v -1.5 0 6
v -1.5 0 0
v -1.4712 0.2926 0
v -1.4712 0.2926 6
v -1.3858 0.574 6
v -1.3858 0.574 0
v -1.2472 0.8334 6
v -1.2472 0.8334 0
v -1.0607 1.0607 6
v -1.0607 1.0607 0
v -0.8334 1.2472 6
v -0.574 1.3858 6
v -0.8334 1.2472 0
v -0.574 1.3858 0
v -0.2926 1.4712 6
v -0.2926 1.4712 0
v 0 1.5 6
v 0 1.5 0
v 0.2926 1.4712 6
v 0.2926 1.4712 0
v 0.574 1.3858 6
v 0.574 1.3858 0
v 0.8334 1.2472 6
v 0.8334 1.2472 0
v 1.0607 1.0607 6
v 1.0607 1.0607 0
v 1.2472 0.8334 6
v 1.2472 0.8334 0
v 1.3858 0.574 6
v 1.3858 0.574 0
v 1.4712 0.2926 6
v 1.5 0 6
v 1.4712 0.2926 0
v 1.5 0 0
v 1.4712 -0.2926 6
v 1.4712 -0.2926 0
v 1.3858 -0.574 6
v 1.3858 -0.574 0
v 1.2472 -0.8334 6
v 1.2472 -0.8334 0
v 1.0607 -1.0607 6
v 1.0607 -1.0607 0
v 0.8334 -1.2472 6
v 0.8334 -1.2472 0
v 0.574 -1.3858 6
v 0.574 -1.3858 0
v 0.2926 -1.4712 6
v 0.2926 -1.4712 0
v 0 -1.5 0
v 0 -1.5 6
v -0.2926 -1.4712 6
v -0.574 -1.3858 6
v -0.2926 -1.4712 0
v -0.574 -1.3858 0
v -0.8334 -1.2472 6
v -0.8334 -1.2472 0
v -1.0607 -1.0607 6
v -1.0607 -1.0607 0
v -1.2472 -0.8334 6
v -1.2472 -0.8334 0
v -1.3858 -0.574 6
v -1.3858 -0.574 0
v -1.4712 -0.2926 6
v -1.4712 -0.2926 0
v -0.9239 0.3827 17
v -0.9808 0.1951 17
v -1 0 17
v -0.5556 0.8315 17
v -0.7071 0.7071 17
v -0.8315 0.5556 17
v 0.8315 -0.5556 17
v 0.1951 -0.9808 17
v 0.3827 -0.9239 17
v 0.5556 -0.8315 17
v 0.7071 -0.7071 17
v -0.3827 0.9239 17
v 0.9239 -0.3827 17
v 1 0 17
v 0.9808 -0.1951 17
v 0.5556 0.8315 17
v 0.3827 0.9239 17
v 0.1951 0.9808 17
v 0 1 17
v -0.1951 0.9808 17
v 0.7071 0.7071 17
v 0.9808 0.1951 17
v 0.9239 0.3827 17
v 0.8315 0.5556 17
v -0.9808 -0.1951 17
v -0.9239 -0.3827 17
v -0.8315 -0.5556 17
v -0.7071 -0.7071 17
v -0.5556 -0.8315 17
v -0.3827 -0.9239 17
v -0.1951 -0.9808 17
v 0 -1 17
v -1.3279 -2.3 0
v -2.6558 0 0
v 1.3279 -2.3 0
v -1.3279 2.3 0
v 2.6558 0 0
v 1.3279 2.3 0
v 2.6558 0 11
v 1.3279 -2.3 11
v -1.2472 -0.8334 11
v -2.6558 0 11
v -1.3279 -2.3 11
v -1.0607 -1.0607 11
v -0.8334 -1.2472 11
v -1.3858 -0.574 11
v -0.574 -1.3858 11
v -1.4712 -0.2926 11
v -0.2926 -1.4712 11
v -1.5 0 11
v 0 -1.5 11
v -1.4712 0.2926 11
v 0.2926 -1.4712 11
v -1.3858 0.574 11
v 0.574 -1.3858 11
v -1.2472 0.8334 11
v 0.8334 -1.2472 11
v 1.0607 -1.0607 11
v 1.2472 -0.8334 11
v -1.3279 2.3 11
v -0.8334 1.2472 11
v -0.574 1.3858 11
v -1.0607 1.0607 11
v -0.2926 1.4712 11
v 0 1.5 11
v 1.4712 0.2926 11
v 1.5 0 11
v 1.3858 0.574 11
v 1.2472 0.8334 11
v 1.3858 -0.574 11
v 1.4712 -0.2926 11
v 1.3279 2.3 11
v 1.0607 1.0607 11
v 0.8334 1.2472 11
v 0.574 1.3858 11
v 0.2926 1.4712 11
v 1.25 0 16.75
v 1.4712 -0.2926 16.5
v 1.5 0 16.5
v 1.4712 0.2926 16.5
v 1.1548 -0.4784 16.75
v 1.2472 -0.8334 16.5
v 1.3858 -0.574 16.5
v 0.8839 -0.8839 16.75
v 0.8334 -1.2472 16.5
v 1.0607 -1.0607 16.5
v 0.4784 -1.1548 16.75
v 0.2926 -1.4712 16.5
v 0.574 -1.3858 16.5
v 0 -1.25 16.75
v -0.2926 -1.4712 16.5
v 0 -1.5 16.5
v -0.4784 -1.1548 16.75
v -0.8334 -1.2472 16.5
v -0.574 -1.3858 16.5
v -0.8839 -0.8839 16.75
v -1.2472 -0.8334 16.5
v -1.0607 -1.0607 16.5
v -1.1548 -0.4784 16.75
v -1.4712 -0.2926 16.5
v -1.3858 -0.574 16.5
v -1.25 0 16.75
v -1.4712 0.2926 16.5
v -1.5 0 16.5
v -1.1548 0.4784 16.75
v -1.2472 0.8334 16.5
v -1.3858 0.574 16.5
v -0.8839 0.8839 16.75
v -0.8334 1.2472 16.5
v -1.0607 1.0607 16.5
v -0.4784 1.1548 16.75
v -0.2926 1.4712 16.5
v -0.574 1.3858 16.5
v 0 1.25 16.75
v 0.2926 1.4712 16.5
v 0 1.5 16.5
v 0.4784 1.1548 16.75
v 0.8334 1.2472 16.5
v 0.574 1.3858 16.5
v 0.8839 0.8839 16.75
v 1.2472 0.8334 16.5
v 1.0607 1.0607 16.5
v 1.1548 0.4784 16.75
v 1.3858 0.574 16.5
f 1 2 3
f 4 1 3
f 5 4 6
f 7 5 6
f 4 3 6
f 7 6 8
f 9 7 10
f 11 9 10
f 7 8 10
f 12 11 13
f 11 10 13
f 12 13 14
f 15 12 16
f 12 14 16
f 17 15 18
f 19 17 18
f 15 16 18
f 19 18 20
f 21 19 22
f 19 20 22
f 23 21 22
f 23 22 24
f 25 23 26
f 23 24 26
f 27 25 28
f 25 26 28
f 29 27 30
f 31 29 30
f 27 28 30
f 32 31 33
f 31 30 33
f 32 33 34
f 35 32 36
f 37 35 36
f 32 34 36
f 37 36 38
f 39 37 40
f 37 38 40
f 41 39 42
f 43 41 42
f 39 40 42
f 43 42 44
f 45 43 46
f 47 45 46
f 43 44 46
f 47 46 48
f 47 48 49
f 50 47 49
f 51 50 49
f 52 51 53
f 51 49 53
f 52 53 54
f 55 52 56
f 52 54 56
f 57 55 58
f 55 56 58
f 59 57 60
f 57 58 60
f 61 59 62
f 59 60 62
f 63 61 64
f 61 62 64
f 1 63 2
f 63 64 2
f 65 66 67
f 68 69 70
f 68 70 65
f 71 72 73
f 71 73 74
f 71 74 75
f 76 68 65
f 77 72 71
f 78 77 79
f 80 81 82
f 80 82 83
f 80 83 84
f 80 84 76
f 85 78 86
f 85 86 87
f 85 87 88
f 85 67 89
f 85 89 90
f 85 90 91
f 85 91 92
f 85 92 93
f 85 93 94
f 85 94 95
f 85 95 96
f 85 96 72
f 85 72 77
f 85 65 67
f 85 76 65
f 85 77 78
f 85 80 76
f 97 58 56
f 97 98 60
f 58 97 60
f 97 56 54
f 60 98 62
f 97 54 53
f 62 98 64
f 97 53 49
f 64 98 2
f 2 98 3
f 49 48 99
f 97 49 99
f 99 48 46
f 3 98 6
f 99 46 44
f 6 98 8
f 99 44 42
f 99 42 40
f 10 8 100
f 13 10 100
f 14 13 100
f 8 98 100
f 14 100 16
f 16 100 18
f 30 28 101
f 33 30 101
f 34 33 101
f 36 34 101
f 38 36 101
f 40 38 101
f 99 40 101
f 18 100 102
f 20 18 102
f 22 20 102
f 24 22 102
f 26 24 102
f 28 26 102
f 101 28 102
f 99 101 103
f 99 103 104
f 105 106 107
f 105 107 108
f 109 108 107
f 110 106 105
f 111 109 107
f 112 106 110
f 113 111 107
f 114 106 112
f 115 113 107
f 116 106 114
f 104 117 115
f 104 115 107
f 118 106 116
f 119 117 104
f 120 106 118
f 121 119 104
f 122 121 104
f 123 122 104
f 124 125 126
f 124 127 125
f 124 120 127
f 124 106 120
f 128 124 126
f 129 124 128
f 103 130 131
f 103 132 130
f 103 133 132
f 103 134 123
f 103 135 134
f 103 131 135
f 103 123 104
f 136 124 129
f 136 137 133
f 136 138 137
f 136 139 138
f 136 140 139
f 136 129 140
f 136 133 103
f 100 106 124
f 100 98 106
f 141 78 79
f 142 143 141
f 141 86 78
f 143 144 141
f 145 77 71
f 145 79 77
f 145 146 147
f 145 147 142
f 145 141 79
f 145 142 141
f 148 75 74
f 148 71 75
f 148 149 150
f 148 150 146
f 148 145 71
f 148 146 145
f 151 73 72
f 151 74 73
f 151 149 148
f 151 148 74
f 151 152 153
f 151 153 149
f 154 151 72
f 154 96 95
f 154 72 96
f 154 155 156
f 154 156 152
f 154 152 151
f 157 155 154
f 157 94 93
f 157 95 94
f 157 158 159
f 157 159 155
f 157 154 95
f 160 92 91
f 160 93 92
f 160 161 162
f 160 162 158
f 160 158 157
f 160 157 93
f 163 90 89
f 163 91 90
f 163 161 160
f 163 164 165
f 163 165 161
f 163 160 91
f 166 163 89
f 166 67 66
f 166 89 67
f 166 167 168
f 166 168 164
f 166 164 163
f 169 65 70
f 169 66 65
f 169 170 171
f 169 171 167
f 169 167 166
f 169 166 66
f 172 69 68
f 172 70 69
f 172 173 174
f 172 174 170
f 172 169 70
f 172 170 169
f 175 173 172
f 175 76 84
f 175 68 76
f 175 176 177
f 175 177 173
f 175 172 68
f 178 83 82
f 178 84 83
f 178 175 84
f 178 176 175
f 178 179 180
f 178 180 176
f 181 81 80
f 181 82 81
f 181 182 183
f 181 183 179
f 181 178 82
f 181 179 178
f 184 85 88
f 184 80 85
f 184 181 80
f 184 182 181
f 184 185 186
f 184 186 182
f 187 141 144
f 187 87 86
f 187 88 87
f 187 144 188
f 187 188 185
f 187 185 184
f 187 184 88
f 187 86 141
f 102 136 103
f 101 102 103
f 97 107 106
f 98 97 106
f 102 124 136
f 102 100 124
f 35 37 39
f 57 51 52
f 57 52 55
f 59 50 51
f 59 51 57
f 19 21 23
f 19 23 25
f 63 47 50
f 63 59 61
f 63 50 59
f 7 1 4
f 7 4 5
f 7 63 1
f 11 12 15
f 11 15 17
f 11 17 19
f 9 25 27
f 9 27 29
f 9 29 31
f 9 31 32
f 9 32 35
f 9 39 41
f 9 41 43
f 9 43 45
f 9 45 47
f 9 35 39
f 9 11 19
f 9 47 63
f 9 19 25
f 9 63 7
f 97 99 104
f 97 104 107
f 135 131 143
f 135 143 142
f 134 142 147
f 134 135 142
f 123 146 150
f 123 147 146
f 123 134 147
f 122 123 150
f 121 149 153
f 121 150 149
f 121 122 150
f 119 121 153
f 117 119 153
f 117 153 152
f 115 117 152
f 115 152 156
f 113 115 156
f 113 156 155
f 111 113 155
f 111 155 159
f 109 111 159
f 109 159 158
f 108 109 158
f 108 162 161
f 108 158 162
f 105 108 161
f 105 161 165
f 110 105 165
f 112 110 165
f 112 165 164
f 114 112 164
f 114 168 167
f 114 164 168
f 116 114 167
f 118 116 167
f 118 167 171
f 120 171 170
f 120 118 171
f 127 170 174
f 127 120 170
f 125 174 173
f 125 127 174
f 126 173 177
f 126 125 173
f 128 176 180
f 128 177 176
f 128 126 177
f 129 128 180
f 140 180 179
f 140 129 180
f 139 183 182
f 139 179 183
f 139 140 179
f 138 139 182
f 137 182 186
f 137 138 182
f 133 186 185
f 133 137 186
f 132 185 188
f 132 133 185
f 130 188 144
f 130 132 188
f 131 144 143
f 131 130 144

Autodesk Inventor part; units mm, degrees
ref_plane "YZ Plane" through (0, 0, 0) normal (1, 0, 0) x (0, 1, 0)
ref_plane "XZ Plane" through (0, 0, 0) normal (0, 1, 0) x (-1, 0, 0)
ref_plane "XY Plane" through (0, 0, 0) normal (0, 0, 1) x (1, 0, 0)
sketch "Base" plane through (0, 0, 0) normal (0, 0, 1) x (1, 0, 0)
  line L0 (1.3279, 2.3) -> (2.6558, 0)
  line L1 (2.6558, 0) -> (1.3279, -2.3)
  line L2 (1.3279, -2.3) -> (-1.3279, -2.3)
  line L3 (-1.3279, -2.3) -> (-2.6558, 0)
  line L4 (-2.6558, 0) -> (-1.3279, 2.3)
  line L5 (-1.3279, 2.3) -> (1.3279, 2.3)
  line L6 (-3.7181, 0) -> (3.7181, 0) construction
  line L7 (0, -3.22) -> (0, 3.22) construction
  point P0 (0, 0)
  point P1 (0, 0)
  dimension "d0" = 4.6
extrude "BaseFeature" add sketch "Base" along normal blind 11
sketch "Sketch2" plane through (0, 0, 11) normal (0, 0, 1) x (1, 0, 0)
  circle A0 centre (0, 0) radius 1.5
  dimension "d3" = 3
extrude "Extrusion2" add sketch "Sketch2" along normal blind 6
chamfer "Chamfer1" distance 0.5 angle 45 1 edges at (-1.5, 0, 17)
sketch "Sketch3" plane through (0, 0, 0) normal (0, 0, -1) x (-1, 0, 0)
  circle A0 centre (0, 0) radius 1.5
  dimension "d9" = 3
extrude "Extrusion3" cut sketch "Sketch3" against normal blind 6
properties part number "UXCell-M3x11-MaleFemaleHexStandoff"
